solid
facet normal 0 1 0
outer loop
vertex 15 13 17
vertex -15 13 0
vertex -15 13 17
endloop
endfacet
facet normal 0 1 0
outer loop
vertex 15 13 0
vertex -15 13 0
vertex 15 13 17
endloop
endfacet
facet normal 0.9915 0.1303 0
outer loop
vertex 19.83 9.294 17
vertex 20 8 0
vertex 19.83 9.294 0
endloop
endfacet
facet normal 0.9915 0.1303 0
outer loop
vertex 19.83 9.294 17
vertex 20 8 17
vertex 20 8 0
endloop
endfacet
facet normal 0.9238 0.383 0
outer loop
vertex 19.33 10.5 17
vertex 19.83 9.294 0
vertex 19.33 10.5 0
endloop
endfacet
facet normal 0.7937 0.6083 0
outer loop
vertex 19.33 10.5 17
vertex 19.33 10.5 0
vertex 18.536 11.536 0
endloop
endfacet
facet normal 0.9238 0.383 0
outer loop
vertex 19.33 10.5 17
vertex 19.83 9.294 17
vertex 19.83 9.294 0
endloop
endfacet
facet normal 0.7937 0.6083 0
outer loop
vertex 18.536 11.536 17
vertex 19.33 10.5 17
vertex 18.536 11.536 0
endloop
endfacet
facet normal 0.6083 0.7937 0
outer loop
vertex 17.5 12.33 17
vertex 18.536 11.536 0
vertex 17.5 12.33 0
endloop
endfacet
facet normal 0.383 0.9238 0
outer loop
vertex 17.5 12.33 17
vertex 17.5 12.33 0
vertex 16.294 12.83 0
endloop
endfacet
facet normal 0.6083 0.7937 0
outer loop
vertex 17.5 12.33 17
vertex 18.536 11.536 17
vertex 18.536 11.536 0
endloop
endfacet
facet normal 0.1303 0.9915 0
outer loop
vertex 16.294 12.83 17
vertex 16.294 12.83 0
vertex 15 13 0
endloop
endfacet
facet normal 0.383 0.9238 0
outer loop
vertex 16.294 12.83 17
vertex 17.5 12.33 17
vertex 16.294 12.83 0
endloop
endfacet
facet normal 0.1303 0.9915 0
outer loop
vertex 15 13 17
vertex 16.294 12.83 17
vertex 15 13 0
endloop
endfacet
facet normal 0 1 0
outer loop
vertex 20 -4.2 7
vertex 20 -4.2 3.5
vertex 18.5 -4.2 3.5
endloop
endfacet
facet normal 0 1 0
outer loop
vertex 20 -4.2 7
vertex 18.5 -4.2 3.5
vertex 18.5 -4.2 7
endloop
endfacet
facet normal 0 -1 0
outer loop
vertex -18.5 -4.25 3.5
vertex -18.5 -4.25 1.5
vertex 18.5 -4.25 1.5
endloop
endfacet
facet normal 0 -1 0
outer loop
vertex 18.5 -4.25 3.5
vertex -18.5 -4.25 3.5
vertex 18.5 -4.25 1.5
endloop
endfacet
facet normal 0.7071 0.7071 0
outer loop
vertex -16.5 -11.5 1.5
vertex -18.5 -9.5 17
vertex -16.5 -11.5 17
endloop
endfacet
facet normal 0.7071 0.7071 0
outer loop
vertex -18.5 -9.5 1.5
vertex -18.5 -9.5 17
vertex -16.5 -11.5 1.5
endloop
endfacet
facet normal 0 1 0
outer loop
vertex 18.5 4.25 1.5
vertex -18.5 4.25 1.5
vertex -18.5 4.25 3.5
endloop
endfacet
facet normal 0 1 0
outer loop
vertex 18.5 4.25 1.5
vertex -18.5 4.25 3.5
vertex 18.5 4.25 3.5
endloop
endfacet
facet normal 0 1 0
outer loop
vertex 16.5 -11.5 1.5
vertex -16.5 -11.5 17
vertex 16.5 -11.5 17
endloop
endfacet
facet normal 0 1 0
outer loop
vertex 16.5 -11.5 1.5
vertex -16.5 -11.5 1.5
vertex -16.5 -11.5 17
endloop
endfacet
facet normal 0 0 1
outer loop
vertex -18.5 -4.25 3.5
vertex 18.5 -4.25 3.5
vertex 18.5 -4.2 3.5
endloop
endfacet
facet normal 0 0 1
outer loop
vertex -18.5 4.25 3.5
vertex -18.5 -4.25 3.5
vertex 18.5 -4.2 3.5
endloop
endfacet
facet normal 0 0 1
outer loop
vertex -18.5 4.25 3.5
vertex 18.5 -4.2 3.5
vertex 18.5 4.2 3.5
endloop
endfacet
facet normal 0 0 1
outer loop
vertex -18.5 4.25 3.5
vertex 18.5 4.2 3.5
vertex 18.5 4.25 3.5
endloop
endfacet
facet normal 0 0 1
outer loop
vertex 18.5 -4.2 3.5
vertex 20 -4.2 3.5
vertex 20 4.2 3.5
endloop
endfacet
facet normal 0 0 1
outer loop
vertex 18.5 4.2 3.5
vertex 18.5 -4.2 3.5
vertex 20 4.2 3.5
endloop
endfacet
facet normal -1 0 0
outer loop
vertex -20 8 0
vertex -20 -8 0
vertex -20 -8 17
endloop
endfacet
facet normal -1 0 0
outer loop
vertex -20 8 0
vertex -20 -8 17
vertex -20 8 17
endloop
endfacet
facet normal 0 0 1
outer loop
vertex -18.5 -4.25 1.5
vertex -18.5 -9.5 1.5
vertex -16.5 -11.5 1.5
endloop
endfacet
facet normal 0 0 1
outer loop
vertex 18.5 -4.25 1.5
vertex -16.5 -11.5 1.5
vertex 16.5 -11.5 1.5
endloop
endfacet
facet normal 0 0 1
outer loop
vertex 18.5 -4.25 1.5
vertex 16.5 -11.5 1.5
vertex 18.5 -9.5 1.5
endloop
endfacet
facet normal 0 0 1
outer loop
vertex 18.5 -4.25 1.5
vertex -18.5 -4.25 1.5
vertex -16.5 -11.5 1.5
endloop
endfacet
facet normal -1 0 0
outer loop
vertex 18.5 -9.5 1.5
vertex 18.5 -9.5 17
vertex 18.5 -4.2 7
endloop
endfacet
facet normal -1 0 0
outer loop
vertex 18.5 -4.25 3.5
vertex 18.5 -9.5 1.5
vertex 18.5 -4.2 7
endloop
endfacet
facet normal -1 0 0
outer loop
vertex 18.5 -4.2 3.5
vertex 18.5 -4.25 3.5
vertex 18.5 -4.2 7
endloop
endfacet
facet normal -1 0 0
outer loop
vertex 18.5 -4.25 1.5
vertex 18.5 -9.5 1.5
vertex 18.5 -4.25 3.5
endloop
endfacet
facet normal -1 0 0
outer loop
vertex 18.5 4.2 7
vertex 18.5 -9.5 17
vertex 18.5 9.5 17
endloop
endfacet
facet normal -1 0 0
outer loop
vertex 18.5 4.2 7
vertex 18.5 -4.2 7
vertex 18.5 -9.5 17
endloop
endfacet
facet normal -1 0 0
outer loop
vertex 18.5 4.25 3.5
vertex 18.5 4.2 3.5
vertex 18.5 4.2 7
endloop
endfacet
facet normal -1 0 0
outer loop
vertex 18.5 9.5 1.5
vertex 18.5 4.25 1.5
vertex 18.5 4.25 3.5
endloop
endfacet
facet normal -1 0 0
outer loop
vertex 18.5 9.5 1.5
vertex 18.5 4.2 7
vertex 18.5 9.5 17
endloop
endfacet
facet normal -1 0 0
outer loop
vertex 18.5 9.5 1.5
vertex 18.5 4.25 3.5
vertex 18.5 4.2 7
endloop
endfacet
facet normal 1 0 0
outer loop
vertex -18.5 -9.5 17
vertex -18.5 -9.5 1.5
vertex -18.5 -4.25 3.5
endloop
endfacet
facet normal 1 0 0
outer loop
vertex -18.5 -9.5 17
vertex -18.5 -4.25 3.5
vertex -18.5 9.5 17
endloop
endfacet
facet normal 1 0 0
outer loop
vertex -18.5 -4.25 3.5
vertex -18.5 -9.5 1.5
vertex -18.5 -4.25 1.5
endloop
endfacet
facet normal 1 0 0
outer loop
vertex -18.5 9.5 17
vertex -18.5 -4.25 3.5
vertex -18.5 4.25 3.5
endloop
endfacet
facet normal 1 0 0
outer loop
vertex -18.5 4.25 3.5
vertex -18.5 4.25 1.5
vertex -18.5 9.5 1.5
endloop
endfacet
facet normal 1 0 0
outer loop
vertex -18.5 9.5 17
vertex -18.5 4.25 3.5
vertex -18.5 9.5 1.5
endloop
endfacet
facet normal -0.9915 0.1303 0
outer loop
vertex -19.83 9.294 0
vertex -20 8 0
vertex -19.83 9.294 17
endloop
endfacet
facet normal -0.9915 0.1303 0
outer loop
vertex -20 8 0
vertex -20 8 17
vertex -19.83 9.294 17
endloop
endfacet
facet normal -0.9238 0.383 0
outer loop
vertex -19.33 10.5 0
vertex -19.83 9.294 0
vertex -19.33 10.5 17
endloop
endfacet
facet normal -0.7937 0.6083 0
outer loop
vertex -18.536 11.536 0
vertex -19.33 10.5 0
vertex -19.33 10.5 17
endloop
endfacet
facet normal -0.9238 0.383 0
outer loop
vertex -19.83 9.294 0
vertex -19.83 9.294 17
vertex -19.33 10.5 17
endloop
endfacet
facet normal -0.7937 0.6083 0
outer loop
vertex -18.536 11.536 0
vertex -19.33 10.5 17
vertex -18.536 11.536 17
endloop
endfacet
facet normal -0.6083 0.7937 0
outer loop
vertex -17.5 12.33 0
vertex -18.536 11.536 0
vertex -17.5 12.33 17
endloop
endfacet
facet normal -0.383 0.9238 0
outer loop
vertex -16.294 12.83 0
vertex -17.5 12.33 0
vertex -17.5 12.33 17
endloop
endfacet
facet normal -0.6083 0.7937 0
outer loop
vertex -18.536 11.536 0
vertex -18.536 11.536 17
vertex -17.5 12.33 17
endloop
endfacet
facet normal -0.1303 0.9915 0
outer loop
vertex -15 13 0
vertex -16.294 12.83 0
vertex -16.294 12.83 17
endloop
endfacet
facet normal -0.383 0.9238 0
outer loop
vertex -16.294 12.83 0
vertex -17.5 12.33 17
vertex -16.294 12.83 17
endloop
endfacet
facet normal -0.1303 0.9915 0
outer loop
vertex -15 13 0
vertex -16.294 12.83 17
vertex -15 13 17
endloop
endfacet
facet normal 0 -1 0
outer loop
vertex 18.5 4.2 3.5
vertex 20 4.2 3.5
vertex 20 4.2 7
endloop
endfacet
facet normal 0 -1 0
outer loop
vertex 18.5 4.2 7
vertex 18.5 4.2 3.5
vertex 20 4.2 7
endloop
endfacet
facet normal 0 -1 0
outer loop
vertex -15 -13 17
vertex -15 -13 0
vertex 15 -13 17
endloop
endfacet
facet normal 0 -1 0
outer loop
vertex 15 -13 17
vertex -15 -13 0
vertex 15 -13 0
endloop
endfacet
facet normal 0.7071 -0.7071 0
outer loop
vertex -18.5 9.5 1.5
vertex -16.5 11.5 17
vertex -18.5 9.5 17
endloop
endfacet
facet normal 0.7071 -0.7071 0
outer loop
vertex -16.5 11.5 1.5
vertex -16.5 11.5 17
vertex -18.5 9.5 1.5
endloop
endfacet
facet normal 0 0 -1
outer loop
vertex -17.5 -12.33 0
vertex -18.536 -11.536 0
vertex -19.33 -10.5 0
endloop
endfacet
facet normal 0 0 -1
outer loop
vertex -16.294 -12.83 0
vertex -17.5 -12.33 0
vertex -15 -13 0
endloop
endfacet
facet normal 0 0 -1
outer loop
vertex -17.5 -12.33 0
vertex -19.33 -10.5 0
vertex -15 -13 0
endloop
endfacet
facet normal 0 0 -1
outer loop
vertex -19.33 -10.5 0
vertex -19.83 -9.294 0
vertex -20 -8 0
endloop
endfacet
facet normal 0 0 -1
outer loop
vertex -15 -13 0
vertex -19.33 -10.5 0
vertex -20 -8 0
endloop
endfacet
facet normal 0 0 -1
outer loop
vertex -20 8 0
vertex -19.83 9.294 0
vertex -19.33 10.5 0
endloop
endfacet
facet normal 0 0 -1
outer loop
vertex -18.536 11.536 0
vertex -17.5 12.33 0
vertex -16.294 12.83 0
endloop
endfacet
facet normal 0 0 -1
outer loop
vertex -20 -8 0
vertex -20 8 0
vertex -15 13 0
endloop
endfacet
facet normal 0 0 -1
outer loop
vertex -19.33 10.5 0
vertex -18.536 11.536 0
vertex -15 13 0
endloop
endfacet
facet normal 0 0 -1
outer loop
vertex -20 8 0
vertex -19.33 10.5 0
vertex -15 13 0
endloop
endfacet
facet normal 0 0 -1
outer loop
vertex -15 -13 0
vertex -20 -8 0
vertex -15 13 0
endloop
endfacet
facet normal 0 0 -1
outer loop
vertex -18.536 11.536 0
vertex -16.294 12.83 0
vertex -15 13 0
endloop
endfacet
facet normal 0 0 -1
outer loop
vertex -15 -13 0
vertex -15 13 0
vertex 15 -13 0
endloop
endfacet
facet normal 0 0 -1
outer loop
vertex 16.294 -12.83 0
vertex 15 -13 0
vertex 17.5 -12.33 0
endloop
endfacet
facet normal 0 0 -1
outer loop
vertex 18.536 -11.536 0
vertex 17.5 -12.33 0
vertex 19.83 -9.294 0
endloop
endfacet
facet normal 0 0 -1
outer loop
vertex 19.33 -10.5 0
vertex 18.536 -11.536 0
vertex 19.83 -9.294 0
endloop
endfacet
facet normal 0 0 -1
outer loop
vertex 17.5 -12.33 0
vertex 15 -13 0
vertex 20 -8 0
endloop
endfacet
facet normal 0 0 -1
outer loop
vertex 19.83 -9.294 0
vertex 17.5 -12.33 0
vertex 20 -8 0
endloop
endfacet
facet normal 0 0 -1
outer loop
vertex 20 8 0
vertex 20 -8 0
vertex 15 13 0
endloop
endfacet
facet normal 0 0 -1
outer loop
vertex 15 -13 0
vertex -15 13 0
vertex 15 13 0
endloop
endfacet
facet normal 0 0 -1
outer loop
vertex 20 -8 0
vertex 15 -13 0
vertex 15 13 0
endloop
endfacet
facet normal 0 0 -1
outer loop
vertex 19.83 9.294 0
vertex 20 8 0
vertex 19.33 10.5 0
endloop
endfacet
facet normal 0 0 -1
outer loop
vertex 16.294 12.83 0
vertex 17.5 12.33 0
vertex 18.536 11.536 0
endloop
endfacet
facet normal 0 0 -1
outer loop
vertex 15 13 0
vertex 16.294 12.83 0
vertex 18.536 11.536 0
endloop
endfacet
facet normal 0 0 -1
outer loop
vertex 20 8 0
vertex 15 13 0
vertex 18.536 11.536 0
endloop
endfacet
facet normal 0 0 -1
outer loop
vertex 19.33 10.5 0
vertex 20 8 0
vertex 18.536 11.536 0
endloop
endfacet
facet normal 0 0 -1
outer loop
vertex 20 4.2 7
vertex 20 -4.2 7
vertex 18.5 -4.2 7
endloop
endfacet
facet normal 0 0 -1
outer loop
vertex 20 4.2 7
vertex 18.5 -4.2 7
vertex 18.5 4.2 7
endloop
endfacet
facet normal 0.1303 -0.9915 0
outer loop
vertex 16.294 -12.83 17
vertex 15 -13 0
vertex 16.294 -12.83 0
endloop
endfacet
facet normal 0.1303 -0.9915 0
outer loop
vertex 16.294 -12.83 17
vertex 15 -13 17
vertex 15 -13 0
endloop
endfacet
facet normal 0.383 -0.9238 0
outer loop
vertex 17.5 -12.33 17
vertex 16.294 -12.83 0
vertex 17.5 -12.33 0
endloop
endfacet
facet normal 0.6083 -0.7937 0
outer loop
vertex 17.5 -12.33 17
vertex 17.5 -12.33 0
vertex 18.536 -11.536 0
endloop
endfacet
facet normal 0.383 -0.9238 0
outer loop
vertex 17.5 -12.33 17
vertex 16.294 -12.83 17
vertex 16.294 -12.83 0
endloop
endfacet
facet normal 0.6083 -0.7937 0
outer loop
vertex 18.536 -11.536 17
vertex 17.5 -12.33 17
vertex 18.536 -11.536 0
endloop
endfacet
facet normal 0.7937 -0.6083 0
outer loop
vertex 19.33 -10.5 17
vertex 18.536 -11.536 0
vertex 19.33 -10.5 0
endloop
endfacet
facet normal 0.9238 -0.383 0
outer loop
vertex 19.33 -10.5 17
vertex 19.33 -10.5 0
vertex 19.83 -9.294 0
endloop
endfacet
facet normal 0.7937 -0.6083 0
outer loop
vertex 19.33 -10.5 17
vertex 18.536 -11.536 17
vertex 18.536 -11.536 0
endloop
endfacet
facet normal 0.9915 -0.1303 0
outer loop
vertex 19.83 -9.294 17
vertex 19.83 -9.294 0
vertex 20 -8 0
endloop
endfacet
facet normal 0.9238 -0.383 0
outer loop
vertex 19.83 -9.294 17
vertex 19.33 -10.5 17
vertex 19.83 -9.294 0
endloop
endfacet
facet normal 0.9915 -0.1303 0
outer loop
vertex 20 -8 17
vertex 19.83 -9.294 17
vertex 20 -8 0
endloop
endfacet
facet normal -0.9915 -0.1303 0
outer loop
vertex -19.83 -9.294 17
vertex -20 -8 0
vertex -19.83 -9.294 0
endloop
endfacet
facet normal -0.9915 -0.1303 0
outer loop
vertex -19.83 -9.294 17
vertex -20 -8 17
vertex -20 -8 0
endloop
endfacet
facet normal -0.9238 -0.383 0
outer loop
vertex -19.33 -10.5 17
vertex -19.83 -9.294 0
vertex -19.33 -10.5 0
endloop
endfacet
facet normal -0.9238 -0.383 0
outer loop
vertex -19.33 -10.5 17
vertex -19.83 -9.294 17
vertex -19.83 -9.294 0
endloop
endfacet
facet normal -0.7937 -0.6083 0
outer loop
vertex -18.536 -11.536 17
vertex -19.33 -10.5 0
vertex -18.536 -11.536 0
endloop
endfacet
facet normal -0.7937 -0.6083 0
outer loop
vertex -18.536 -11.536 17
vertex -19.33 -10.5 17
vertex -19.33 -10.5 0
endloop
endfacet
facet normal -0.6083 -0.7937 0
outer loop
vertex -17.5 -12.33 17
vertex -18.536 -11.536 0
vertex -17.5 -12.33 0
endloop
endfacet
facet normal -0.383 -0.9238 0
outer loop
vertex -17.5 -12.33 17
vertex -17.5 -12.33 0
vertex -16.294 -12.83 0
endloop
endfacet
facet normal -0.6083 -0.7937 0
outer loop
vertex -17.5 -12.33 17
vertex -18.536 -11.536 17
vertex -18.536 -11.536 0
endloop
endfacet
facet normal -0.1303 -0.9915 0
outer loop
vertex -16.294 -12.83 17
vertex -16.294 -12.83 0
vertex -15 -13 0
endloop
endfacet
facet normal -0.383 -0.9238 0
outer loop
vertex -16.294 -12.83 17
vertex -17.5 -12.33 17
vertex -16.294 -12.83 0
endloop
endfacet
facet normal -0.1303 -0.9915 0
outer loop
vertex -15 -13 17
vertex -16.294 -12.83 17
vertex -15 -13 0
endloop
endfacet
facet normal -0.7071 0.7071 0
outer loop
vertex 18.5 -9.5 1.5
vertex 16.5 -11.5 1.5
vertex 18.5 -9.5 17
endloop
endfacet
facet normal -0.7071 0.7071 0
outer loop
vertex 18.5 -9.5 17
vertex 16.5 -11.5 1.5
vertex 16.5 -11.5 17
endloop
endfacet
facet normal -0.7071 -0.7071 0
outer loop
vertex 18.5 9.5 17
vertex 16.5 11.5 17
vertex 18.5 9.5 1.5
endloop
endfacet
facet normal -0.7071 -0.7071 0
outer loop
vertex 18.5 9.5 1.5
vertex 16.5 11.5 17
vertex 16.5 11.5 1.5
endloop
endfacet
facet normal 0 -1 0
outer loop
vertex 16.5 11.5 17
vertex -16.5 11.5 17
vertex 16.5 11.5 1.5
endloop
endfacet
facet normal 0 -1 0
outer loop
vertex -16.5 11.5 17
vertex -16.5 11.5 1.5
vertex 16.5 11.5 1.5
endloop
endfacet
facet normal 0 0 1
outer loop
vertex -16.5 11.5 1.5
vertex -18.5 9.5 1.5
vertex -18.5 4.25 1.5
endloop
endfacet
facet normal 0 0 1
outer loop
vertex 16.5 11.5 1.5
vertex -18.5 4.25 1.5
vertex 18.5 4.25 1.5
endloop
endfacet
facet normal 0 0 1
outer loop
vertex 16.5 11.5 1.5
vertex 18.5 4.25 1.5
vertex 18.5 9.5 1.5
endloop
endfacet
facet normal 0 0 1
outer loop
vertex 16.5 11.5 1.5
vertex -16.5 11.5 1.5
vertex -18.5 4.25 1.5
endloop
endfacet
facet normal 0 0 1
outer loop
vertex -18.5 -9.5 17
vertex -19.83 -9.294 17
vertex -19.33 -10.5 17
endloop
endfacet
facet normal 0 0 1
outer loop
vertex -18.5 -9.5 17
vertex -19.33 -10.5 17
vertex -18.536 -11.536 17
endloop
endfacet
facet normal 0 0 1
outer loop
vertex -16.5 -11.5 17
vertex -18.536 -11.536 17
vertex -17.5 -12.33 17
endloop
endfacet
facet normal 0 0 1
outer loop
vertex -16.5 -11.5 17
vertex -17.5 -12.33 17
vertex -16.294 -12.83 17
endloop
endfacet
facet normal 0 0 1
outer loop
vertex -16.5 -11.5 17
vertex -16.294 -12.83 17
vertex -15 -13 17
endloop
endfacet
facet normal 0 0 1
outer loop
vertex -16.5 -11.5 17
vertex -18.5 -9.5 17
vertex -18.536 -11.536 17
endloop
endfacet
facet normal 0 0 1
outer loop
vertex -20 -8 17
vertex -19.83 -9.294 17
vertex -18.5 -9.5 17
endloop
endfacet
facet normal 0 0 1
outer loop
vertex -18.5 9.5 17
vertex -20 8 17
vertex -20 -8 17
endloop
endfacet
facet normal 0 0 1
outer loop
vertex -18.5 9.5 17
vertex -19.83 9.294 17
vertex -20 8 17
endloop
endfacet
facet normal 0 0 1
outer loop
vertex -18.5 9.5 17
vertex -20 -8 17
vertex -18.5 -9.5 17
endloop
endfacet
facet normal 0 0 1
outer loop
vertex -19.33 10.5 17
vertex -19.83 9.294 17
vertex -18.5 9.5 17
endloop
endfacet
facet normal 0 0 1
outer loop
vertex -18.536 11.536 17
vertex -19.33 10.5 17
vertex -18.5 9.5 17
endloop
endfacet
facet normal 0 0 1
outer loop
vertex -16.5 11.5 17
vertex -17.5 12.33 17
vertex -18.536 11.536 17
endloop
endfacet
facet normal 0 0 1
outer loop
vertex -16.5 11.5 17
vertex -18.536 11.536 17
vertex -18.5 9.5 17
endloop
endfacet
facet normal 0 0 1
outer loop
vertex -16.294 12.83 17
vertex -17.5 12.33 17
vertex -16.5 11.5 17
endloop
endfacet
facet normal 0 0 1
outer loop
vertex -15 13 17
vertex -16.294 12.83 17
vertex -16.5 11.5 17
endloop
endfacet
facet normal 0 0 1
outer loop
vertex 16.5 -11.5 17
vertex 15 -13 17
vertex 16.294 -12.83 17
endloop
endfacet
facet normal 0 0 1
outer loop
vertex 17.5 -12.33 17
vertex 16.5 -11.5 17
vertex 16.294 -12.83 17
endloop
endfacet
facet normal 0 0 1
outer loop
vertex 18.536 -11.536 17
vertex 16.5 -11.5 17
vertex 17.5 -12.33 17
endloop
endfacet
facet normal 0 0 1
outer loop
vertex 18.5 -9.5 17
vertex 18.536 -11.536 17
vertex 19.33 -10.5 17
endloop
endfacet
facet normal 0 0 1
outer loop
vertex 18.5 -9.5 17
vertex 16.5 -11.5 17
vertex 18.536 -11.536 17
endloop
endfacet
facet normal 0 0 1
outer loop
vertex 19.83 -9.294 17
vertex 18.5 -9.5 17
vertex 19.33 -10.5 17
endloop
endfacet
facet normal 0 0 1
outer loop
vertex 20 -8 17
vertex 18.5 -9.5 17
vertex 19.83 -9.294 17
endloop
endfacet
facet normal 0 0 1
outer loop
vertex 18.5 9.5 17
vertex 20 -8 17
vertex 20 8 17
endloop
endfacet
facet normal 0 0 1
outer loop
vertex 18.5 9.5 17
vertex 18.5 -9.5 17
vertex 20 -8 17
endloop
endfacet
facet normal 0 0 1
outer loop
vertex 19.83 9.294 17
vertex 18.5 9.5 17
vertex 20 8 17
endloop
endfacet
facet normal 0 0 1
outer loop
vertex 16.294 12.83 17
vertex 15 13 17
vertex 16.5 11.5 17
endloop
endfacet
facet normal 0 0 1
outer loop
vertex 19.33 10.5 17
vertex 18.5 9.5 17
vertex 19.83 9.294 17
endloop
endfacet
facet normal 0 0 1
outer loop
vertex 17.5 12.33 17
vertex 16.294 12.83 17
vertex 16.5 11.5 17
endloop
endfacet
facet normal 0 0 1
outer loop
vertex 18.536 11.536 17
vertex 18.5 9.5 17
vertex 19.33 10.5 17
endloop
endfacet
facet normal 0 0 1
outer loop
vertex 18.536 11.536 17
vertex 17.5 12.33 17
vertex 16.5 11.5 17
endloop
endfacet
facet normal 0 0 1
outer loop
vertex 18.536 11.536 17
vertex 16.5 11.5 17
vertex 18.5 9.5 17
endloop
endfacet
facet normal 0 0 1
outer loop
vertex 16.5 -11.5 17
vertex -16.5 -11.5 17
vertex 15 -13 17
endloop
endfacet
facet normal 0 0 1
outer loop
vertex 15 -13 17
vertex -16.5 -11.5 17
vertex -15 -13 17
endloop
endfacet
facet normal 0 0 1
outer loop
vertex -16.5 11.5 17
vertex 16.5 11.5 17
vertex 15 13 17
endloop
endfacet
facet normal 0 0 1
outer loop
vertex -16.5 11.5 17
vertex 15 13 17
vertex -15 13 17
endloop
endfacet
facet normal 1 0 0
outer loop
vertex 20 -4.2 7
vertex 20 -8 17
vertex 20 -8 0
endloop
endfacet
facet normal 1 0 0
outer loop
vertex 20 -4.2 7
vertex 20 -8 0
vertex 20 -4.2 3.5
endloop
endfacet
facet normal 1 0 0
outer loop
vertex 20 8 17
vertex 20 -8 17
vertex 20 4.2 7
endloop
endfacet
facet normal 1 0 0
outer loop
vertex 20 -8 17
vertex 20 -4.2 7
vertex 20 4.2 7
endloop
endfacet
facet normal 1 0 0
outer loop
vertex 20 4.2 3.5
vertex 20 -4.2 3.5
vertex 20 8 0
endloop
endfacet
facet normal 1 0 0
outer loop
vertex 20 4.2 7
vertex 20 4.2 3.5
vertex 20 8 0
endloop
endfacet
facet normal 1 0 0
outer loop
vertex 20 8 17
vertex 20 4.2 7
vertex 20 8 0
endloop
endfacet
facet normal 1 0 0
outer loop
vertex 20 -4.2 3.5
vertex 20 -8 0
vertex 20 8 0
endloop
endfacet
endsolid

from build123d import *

# Parameters (mm, degrees)
F0_W     = 40
F0_H     = 26
F1_DEPTH = 17
F2_T     = -1.5
F3_W     = 37
F3_H     = 8.5
F4_DEPTH = 2
F5_W     = 8.4
F5_H     = 3.5
F6_DEPTH = 1.5
F7_SIZE  = 2
F8_R     = 5


with BuildPart() as f1:
    # F0 (on Top) → F1 (new body)
    with BuildSketch(Plane.XY):
        Rectangle(F0_W, F0_H)
    extrude(amount=F1_DEPTH)

    # F2
    f2_openings = [f1.faces().sort_by_distance(p)[0] for p in [
        (0, 0, 17),
    ]]
    offset(amount=F2_T, openings=f2_openings)

    # F3 (on face) → F4 (join)
    with BuildSketch(Plane.XY.offset(1.5)):
        Rectangle(F3_W, F3_H)
    extrude(amount=F4_DEPTH)

    # F5 (on face) → F6 (cut, through all)
    with BuildSketch(Plane.YZ.offset(20)):
        with Locations((0, 5.25)):
            Rectangle(F5_W, F5_H)
    extrude(amount=-F6_DEPTH, mode=Mode.SUBTRACT)

    # F7
    f7_edges = [f1.edges().sort_by_distance(p)[0] for p in [
        (-18.5, 11.5, 9.25),
        (18.5, 11.5, 9.25),
        (18.5, -11.5, 9.25),
        (-18.5, -11.5, 9.25),
    ]]
    chamfer(f7_edges, length=F7_SIZE)

    # F8
    f8_edges = [f1.edges().sort_by_distance(p)[0] for p in [
        (-20, 13, 8.5),
        (20, 13, 8.5),
        (20, -13, 8.5),
        (-20, -13, 8.5),
    ]]
    fillet(f8_edges, radius=F8_R)


solid = f1.part
